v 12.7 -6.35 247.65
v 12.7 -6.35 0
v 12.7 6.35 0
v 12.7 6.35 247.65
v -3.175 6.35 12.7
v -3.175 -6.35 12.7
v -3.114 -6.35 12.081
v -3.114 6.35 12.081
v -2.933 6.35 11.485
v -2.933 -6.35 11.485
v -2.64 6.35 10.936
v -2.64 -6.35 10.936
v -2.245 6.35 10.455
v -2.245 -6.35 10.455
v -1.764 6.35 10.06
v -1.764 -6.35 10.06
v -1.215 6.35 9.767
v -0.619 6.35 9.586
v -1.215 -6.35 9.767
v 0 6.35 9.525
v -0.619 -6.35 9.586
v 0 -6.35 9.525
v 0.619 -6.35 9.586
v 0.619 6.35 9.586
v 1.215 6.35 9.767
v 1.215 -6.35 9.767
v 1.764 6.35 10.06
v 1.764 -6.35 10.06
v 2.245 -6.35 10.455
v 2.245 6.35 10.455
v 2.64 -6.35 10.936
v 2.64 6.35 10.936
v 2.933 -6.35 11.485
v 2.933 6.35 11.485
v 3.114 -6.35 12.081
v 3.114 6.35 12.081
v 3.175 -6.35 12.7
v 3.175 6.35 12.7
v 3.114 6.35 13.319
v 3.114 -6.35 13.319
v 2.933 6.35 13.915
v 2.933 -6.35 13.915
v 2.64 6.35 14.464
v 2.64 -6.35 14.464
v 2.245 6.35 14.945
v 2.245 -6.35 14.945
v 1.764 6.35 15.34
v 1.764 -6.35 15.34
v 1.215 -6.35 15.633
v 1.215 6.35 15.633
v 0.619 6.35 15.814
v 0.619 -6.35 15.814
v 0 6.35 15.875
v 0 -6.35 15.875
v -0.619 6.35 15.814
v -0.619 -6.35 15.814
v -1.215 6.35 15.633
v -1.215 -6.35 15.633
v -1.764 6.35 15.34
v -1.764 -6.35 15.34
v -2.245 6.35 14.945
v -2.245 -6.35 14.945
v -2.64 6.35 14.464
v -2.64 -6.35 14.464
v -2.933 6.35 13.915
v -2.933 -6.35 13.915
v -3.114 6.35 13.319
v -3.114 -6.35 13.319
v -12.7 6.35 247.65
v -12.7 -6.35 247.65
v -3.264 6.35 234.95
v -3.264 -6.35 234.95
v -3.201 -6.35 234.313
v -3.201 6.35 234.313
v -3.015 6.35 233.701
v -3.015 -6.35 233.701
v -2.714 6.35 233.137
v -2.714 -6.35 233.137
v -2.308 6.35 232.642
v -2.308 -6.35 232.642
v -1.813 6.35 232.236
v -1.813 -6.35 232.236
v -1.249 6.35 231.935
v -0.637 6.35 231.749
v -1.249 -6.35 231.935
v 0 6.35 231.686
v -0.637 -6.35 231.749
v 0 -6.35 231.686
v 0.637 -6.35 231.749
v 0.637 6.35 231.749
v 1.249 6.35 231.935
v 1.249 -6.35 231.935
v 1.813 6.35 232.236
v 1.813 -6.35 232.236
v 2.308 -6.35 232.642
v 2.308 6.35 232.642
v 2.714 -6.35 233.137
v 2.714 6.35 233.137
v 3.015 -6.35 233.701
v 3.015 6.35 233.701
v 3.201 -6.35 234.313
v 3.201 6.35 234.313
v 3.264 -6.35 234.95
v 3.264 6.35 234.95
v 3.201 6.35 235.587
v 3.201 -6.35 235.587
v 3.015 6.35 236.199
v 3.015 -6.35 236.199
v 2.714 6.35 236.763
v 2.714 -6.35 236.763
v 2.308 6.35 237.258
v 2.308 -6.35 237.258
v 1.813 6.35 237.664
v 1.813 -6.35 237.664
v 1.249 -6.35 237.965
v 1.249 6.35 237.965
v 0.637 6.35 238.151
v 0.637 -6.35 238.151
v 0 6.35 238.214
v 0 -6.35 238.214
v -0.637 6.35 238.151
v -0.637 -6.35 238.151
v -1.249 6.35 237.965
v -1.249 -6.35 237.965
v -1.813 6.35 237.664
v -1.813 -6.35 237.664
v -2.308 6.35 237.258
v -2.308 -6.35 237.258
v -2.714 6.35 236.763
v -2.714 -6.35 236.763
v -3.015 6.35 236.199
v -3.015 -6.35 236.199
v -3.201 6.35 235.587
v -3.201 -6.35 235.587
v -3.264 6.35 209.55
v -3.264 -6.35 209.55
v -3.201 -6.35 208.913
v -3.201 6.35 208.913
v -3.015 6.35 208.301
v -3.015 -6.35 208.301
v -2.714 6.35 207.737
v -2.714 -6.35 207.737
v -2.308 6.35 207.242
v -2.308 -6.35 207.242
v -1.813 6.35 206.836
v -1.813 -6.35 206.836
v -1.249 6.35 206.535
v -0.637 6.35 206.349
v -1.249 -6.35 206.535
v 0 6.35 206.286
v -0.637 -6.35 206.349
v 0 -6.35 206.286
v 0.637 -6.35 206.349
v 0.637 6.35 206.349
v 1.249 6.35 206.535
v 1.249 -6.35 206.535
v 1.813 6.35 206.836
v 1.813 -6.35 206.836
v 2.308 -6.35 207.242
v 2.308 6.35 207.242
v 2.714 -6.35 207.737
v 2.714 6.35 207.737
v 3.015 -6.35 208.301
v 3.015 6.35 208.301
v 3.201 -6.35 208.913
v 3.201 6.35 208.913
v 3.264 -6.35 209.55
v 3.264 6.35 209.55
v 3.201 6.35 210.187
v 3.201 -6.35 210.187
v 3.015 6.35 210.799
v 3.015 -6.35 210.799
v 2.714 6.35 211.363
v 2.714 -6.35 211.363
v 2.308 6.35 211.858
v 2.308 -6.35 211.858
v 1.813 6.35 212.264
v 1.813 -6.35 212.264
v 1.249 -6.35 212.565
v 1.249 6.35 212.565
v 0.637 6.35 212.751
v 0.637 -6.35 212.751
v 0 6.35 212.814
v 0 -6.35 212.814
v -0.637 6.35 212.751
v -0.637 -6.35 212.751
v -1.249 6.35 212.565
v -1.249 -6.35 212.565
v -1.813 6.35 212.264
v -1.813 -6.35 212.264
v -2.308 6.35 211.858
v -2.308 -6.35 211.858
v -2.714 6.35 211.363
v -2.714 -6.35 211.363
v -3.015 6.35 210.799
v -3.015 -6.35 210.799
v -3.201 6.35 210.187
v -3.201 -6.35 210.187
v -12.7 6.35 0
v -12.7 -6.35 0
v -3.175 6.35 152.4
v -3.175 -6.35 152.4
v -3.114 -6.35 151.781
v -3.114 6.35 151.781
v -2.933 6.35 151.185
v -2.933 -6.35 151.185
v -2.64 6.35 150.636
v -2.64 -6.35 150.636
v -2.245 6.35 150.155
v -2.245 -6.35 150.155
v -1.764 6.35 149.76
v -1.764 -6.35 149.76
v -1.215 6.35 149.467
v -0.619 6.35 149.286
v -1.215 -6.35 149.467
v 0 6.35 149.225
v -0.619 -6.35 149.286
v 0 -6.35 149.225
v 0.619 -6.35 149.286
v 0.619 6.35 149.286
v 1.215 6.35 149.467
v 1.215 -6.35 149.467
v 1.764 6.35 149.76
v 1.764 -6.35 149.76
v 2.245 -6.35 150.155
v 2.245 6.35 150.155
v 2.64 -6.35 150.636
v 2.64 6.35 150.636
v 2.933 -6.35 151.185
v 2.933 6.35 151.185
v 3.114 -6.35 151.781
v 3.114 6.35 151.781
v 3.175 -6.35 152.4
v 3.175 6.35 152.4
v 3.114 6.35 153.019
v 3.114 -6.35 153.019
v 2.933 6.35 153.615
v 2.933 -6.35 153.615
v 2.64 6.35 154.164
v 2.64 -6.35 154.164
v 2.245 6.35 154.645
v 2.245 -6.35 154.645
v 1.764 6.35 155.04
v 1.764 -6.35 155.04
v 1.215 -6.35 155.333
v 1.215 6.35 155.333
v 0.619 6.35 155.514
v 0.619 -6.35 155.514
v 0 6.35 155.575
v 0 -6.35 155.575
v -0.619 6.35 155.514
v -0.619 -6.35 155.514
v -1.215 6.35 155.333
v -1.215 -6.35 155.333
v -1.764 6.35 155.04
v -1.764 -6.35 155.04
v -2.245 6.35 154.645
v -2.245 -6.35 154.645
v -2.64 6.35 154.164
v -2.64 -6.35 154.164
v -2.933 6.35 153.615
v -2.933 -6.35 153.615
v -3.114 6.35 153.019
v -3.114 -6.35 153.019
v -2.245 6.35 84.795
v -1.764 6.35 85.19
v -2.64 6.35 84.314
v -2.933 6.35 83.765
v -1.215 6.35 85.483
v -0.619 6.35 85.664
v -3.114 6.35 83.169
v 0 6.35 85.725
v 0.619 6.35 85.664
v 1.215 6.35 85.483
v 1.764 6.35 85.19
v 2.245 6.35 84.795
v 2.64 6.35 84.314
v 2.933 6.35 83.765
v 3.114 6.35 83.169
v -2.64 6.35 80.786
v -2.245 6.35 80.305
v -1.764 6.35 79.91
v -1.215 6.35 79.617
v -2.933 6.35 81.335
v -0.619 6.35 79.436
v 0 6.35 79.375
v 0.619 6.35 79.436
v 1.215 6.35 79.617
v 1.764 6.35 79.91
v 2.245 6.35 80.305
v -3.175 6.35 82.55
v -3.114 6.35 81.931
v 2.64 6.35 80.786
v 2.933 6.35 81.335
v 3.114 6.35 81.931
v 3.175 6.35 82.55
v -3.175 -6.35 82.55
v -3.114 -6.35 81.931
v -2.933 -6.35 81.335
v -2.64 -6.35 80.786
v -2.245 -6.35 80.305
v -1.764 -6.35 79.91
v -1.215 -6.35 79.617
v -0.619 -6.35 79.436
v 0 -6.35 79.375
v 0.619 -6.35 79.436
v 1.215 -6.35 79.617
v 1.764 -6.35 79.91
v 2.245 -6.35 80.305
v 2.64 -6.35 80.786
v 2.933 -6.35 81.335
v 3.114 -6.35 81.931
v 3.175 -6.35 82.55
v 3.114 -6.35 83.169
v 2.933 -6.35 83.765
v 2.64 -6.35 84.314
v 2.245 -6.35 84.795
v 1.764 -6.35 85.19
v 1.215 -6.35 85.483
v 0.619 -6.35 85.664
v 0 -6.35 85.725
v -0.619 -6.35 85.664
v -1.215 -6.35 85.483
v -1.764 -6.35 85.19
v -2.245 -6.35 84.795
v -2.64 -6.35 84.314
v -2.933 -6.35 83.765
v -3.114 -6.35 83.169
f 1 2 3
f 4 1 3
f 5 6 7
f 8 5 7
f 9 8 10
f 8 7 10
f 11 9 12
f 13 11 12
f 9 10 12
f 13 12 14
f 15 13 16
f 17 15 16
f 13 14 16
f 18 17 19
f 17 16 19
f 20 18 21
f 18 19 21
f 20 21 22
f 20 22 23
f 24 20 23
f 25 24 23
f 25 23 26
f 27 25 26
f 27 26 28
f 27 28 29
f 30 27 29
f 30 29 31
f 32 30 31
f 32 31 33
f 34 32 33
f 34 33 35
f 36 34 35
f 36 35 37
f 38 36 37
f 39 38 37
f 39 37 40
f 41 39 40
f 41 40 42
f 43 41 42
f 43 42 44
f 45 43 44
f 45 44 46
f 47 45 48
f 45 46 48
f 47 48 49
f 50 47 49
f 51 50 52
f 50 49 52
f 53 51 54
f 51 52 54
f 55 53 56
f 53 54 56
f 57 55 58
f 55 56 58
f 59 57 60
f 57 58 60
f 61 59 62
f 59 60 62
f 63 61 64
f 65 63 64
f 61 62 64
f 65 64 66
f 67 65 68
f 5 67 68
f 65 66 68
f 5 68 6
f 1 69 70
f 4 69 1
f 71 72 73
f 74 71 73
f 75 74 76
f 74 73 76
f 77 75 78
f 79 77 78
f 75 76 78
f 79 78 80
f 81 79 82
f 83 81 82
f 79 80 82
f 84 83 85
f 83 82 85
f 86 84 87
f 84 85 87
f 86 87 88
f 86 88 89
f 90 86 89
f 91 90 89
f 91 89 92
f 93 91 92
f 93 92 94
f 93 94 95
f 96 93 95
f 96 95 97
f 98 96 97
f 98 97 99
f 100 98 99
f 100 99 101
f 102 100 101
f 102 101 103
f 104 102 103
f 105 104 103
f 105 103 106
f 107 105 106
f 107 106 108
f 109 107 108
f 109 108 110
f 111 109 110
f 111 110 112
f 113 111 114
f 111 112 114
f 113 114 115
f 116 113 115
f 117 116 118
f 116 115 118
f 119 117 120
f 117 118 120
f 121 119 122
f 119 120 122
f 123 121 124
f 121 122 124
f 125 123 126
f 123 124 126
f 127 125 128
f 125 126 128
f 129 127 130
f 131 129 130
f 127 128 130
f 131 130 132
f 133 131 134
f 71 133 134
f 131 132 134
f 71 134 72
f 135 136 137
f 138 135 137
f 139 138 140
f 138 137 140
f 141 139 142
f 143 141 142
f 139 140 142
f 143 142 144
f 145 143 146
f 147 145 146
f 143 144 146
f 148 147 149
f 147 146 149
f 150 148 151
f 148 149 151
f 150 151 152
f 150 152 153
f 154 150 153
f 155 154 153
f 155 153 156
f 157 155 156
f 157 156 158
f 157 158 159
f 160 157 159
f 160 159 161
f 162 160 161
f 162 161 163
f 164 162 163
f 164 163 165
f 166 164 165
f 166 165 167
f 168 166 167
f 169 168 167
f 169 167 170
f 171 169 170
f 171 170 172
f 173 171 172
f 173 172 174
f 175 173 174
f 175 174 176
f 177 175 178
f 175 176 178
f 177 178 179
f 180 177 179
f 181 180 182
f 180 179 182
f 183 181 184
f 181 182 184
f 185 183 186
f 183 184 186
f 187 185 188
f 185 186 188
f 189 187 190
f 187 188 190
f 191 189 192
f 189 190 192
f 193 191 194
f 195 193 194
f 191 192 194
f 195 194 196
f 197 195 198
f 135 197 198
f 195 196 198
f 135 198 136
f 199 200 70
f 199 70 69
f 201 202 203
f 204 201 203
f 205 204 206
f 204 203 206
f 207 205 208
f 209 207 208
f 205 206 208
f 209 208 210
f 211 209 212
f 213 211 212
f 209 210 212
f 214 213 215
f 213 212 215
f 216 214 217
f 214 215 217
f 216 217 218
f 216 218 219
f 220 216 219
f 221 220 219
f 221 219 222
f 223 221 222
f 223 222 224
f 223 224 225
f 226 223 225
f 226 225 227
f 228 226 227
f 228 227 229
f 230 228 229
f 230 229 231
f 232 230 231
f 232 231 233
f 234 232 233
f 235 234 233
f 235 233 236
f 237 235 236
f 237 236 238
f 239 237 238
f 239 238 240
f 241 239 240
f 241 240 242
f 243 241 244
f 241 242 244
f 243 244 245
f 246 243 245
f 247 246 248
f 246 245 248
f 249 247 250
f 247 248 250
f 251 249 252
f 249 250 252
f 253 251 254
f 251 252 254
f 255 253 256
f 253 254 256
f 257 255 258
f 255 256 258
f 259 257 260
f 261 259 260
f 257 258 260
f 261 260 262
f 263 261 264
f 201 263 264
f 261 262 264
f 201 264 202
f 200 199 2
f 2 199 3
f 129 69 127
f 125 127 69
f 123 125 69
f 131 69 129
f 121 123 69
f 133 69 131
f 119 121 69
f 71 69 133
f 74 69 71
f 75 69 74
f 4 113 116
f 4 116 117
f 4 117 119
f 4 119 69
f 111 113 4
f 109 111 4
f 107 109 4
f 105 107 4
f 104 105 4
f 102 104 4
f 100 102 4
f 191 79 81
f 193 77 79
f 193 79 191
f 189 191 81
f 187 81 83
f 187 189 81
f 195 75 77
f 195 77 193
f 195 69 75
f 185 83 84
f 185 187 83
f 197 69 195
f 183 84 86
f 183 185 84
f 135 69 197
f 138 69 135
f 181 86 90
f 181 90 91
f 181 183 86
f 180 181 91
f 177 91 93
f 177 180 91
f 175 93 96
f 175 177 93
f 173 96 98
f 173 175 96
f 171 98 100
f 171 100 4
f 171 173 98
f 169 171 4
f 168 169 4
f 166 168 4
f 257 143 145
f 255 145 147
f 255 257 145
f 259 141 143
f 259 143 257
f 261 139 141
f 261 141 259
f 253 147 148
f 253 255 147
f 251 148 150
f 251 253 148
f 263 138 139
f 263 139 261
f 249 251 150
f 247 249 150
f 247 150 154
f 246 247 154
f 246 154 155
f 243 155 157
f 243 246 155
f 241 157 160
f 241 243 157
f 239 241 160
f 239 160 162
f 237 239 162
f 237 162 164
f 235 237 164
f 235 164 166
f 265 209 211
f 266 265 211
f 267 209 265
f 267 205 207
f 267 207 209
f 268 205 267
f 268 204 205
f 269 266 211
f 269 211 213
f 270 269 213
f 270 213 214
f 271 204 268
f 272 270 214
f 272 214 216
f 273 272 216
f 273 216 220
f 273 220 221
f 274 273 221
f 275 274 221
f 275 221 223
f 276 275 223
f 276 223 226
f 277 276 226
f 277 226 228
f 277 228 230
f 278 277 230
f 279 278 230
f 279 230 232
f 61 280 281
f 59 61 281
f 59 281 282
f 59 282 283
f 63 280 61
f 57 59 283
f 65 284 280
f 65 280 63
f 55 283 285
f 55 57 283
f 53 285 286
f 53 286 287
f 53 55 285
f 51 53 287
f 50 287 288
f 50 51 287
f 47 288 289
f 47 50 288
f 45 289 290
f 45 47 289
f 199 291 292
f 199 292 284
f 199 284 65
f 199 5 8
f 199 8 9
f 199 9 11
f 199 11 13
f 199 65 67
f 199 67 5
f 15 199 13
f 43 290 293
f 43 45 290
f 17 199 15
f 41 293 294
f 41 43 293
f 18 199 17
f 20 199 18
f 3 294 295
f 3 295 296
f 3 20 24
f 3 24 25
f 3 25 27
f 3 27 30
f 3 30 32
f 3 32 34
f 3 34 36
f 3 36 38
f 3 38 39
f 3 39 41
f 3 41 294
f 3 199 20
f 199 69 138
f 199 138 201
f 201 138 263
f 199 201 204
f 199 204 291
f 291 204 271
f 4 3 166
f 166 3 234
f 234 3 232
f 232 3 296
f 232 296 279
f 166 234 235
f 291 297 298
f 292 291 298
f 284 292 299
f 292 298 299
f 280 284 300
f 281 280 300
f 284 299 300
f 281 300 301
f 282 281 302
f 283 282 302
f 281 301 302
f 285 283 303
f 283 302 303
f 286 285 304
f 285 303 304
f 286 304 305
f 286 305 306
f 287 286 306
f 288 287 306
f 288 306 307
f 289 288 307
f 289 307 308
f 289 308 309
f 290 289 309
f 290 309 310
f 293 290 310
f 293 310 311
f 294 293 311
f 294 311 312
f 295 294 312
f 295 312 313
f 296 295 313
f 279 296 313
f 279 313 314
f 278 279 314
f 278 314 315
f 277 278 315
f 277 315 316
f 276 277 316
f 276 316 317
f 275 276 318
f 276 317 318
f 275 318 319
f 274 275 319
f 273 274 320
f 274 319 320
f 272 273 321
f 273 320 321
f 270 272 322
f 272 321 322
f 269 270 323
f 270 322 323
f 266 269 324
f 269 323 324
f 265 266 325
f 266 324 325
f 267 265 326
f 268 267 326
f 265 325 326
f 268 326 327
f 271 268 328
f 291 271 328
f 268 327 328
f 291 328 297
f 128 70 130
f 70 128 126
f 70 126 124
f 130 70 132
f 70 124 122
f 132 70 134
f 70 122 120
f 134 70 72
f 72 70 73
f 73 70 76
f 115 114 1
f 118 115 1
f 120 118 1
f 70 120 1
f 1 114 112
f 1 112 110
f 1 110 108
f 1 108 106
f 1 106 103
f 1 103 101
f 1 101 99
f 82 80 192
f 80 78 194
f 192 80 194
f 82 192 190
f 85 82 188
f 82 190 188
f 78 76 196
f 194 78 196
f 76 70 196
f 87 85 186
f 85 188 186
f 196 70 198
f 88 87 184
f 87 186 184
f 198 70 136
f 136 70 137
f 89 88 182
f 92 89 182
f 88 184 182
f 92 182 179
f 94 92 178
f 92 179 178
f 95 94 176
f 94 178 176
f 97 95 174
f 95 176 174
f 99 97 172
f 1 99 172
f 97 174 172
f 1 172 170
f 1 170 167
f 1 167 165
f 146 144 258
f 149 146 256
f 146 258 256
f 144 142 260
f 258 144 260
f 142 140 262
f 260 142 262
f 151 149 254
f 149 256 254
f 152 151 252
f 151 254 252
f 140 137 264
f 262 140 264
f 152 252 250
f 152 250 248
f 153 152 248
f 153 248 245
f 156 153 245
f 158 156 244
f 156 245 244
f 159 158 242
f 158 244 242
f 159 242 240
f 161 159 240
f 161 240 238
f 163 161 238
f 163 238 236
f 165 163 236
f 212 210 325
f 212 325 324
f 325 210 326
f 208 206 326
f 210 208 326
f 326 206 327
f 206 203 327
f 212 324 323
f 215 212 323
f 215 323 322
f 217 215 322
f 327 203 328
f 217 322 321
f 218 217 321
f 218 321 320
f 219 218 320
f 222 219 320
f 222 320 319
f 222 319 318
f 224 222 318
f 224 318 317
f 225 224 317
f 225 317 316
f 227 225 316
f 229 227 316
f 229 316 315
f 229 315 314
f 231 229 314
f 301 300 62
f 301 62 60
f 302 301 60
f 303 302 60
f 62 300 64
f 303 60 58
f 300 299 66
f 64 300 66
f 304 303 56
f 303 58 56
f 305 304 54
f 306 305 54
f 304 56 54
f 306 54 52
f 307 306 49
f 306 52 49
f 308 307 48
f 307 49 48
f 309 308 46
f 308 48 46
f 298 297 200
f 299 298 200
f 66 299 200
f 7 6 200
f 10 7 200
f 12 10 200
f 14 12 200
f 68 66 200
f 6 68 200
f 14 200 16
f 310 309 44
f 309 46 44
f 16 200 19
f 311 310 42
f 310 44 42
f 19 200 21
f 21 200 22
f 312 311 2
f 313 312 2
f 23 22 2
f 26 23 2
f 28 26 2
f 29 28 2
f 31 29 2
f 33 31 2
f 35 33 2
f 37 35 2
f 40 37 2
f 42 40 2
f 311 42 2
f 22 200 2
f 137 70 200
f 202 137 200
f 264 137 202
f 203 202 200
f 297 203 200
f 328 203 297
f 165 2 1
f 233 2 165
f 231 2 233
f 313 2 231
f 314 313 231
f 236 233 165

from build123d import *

# Parameters (mm, degrees)
SKETCH1_W                   = 25.4
SKETCH1_H                   = 12.7
BOSS_EXTRUDE1_DEPTH         = 247.65
F_1_4_CLEARANCE_HOLE1_D     = 6.5278
F_1_4_0_25_DIAMETER_HOLE1_D = 6.35


with BuildPart() as part:
    # Sketch1 → Boss-Extrude1 (new body)
    with BuildSketch(Plane.XY):
        Rectangle(SKETCH1_W, SKETCH1_H)
    extrude(amount=BOSS_EXTRUDE1_DEPTH)

    # 1/4 Clearance Hole1 (through all)
    with Locations(Plane(origin=(0, 6.35, 0), x_dir=(1, 0, 0), z_dir=(0, 1, 0))):
        with Locations((0, -234.95), (0, -209.55)):
            Hole(F_1_4_CLEARANCE_HOLE1_D / 2)

    # 1/4 (0.25) Diameter Hole1 (through all)
    with Locations(Plane(origin=(0, 6.35, 0), x_dir=(1, 0, 0), z_dir=(0, 1, 0))):
        with Locations((0, -82.55), (0, -12.7), (0, -152.4)):
            Hole(F_1_4_0_25_DIAMETER_HOLE1_D / 2)


solid = part.part
